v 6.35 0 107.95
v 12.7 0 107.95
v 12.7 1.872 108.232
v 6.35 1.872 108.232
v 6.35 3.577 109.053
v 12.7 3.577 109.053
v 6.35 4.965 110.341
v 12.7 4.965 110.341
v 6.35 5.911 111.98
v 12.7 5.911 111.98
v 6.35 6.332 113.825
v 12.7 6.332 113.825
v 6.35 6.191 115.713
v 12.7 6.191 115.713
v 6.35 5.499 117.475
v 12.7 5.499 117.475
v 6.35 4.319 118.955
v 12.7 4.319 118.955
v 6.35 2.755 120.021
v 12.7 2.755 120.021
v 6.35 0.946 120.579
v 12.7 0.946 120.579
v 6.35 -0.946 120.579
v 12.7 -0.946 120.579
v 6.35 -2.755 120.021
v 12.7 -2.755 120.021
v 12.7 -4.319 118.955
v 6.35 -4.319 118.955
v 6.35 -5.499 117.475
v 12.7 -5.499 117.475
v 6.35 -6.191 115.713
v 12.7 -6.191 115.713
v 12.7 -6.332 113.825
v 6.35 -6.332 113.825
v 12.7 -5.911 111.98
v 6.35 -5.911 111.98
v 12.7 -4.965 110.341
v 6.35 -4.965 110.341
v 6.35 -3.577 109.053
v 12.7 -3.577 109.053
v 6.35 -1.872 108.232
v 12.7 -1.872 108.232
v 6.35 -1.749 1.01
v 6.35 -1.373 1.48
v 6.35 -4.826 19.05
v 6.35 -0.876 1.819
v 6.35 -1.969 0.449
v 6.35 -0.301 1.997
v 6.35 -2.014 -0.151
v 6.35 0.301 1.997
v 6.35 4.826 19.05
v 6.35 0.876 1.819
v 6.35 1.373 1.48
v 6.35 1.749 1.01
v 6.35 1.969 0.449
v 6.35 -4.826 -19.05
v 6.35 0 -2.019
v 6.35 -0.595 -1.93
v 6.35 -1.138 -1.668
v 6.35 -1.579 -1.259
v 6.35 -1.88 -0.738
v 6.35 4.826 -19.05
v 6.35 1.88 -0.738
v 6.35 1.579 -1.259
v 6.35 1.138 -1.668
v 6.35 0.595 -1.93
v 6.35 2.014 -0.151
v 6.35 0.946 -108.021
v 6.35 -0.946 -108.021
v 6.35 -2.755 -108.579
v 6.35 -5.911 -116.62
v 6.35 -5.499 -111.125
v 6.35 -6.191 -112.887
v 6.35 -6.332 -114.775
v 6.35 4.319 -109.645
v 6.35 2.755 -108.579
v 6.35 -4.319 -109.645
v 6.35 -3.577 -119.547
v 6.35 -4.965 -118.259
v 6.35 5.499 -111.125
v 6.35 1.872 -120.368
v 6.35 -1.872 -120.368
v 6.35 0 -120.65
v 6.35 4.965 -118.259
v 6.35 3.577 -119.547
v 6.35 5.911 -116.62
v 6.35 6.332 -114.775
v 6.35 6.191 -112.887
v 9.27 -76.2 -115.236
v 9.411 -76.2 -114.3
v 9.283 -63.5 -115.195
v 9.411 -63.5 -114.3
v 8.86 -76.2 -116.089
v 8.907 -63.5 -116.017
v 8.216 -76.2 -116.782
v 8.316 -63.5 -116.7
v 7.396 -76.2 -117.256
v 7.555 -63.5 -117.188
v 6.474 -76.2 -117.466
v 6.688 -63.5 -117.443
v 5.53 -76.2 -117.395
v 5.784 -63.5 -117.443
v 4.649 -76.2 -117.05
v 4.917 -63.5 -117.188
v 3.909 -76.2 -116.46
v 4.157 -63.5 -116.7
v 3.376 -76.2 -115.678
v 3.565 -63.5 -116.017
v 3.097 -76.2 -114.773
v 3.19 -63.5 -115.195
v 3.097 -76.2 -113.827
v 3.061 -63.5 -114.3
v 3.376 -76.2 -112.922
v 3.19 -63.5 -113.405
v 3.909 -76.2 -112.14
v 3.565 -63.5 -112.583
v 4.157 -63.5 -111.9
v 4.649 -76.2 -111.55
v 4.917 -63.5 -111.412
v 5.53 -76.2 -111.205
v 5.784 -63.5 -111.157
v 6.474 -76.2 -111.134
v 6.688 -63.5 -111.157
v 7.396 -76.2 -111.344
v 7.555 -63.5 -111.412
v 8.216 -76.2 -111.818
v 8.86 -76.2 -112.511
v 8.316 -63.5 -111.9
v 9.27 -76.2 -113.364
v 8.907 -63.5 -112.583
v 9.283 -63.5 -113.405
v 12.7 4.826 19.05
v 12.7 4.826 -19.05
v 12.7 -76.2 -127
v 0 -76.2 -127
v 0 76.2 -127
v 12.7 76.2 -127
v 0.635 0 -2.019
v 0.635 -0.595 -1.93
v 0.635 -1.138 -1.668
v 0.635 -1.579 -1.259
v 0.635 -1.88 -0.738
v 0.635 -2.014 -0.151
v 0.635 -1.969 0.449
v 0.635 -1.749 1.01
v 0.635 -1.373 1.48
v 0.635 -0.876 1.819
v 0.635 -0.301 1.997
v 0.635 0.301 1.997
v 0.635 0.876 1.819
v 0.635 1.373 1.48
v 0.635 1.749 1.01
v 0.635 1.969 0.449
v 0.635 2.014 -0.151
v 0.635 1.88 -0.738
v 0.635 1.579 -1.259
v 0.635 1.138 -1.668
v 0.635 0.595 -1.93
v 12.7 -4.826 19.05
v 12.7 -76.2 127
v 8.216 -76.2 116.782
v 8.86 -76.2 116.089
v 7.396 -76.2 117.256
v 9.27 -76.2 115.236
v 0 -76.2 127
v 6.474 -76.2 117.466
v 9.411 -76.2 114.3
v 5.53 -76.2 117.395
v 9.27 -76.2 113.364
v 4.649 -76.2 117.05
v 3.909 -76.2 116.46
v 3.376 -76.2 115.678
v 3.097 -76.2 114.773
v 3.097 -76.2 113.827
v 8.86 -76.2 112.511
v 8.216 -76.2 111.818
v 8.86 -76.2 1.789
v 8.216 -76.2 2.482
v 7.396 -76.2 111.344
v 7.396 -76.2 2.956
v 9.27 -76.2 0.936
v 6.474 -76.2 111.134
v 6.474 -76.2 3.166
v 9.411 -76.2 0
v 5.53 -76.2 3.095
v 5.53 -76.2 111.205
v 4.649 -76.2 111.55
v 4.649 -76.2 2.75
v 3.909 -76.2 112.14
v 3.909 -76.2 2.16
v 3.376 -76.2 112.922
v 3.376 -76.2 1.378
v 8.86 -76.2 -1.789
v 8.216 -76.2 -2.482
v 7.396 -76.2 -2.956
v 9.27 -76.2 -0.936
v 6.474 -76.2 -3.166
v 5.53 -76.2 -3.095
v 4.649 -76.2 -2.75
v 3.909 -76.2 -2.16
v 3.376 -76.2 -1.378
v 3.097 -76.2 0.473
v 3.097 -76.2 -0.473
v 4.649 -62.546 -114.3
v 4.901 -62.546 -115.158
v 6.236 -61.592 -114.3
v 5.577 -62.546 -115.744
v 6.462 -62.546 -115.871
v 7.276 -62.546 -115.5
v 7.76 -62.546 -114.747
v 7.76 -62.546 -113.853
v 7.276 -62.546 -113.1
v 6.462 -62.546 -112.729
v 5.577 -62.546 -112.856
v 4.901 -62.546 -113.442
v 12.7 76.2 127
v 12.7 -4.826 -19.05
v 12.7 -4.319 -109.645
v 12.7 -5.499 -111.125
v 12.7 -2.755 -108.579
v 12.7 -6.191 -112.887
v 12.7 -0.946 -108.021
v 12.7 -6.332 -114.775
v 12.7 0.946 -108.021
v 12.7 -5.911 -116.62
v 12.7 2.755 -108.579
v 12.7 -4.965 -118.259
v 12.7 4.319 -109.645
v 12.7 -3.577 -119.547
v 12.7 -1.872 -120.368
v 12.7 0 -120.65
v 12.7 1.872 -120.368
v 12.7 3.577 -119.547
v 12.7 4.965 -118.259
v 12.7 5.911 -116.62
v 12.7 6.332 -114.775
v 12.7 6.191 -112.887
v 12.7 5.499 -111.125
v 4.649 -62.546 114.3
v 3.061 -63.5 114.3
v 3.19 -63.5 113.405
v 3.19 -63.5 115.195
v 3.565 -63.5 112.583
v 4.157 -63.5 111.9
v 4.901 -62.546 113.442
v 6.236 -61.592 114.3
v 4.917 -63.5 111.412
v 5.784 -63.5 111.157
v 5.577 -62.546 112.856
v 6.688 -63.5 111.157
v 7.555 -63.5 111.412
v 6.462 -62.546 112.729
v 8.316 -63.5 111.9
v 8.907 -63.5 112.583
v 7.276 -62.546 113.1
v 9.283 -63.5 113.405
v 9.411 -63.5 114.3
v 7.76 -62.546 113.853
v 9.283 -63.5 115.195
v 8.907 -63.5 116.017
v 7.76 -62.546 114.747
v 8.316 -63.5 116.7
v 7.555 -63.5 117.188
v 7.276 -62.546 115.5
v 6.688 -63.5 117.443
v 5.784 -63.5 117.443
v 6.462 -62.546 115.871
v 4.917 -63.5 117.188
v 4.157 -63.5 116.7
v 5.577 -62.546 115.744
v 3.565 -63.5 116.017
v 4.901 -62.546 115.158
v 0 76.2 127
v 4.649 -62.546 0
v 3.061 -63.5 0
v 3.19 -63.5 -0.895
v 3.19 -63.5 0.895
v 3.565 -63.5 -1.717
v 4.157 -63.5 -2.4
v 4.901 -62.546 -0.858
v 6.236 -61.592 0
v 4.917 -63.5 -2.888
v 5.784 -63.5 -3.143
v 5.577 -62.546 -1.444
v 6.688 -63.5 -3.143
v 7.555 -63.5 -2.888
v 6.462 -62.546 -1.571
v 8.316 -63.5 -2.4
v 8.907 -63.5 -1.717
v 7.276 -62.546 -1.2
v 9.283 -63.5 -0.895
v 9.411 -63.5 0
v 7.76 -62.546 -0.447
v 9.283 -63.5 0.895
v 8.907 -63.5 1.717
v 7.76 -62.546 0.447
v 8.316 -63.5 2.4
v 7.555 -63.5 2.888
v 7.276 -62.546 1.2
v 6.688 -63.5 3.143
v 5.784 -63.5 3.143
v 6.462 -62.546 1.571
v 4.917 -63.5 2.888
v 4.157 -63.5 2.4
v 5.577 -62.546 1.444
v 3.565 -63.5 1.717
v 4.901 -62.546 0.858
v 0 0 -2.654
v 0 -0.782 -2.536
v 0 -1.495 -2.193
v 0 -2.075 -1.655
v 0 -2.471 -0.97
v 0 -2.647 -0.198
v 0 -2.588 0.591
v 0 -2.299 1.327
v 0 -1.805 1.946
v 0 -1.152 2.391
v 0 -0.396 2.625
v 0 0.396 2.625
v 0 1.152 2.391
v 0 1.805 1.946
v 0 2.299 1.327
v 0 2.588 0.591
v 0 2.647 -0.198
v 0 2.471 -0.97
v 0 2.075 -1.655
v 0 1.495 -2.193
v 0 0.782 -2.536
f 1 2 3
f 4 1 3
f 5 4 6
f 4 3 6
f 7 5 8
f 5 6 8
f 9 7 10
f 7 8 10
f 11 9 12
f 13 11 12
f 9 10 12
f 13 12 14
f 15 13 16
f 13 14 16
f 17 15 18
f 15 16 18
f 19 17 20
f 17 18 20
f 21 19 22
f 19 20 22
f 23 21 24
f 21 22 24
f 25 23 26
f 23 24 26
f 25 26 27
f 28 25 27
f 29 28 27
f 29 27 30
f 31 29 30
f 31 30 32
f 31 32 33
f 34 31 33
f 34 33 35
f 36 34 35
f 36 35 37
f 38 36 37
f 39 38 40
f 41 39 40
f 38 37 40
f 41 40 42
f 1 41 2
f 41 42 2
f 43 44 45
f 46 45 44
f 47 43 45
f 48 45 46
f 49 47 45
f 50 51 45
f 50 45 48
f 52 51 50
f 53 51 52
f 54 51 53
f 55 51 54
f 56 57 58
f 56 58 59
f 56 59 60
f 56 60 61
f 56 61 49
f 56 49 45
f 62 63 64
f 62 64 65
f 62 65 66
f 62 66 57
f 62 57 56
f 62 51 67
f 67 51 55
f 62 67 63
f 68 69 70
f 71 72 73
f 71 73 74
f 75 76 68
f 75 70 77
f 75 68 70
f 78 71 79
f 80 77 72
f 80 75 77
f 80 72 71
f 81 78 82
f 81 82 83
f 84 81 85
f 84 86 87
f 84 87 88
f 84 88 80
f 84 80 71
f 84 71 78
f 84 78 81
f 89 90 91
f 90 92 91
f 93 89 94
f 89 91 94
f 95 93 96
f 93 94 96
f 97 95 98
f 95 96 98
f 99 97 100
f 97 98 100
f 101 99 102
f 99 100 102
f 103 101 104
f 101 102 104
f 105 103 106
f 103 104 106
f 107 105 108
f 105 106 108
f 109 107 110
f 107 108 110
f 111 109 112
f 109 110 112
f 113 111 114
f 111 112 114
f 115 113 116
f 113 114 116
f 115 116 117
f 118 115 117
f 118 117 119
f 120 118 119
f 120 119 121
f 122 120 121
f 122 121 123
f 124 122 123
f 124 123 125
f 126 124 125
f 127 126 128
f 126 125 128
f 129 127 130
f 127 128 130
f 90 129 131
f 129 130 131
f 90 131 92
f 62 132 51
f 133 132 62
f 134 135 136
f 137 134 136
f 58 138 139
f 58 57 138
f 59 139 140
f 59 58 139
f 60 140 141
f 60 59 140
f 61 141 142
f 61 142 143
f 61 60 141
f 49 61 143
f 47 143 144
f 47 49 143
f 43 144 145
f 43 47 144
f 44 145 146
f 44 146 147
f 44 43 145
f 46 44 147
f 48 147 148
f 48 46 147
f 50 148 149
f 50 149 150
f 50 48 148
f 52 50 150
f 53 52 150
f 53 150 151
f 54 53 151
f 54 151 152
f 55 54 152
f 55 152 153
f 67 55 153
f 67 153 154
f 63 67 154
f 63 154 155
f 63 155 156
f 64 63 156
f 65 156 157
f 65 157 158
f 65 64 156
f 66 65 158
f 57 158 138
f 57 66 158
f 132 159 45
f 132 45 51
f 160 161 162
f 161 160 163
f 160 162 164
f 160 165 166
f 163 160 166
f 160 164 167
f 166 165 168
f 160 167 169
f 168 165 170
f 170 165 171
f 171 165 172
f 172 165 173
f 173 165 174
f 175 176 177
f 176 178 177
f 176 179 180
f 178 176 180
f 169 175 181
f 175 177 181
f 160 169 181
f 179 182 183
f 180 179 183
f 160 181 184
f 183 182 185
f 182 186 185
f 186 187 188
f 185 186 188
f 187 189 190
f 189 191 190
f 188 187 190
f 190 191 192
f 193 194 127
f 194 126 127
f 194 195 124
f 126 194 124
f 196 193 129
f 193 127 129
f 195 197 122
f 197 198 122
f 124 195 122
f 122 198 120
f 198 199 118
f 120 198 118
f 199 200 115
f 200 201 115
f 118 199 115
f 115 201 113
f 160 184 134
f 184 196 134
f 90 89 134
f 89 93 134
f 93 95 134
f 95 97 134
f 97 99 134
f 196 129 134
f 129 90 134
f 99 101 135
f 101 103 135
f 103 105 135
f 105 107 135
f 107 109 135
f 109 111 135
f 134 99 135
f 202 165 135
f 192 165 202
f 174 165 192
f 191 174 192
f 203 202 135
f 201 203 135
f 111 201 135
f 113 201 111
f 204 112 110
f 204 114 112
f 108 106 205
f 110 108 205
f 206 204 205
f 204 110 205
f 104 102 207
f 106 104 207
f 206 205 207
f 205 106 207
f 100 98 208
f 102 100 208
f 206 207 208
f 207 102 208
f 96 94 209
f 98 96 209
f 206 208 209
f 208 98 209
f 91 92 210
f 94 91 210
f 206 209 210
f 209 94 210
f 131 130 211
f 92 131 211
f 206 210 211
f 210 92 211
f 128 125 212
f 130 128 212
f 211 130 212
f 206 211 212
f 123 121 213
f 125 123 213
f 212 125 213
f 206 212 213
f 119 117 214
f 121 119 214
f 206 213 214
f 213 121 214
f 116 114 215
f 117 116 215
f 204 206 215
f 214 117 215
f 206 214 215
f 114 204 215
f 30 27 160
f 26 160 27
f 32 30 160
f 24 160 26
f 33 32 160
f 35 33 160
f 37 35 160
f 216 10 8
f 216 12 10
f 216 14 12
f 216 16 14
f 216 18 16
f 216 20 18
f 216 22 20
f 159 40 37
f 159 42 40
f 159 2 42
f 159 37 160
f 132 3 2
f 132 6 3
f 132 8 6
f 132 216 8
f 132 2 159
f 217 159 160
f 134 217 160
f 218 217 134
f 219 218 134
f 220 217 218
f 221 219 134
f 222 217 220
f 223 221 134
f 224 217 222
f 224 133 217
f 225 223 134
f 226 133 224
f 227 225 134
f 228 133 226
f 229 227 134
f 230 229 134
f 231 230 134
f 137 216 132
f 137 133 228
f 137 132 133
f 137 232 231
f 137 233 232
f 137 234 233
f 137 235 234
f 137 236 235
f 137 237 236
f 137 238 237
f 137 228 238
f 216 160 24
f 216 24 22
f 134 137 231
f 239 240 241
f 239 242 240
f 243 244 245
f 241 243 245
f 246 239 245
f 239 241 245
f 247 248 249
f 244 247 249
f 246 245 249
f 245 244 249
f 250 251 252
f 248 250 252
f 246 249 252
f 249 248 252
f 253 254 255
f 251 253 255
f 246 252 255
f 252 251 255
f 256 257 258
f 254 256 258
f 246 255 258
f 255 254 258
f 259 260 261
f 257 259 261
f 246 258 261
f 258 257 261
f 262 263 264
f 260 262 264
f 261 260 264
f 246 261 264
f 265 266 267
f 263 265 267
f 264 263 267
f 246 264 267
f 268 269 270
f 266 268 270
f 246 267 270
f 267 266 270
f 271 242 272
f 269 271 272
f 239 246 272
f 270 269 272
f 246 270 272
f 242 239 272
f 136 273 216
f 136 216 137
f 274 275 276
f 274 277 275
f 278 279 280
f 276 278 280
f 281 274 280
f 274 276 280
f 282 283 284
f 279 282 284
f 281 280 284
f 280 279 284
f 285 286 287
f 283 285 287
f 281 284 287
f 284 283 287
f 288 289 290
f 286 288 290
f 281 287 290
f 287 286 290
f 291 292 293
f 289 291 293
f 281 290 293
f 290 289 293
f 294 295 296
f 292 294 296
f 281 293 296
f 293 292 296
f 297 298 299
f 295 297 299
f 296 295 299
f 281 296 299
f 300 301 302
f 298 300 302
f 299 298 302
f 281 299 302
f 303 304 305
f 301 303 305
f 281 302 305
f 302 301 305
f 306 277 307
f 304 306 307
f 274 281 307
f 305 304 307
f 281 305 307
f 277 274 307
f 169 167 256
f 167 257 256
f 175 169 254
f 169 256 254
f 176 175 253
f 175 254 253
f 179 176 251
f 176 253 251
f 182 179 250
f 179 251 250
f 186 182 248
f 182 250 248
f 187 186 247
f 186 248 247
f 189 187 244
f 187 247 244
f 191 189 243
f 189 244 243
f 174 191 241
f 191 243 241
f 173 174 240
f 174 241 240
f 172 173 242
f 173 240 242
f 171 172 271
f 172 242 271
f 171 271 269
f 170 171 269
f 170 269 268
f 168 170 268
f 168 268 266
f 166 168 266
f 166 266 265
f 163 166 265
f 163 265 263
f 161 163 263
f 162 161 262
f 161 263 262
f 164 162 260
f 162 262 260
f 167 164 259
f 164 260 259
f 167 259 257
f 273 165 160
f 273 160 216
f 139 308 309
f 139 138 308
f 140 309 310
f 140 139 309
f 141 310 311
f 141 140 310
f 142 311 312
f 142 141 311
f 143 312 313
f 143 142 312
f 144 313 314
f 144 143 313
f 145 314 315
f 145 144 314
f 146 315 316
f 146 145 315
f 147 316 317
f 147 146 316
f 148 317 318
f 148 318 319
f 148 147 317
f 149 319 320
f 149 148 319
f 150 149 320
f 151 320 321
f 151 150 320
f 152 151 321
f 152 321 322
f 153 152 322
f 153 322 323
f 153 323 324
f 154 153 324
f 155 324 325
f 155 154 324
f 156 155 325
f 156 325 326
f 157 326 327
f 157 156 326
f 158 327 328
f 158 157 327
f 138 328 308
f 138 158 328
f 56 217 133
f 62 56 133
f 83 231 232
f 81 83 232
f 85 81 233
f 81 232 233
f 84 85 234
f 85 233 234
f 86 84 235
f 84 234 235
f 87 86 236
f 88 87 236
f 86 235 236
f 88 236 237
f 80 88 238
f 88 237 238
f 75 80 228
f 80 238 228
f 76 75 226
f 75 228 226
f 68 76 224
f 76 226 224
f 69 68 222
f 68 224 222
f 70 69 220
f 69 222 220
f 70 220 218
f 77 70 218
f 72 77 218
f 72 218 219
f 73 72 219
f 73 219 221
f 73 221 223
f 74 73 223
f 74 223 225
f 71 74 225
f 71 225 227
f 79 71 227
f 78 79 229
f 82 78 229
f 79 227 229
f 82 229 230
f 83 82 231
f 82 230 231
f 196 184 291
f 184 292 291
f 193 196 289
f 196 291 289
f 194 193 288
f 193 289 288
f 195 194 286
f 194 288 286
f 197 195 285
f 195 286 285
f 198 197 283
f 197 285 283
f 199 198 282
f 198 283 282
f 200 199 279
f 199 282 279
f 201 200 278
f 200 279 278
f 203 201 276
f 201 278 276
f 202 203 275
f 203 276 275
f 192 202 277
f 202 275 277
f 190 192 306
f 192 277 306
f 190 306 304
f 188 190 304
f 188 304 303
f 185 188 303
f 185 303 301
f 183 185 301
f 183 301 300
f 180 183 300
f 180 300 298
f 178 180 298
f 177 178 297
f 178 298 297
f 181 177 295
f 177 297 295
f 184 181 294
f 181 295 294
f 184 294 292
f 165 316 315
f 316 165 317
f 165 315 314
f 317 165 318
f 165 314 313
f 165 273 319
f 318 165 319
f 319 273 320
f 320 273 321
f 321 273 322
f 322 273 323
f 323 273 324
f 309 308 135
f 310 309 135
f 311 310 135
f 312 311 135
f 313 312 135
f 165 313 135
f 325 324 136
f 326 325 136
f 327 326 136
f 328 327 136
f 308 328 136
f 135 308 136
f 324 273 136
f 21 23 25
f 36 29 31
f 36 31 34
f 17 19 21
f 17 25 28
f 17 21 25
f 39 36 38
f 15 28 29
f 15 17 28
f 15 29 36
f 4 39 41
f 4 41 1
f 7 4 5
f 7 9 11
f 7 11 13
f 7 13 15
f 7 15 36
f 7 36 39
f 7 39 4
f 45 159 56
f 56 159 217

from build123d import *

# Parameters (mm, degrees)
SKETCH1_W                       = 254
SKETCH1_H                       = 152.4
BOSS_EXTRUDE1_DEPTH             = 12.7
SKETCH3_R                       = 6.35
CUT_EXTRUDE2_DEPTH              = 6.35
F_1_4_0_25_DIAMETER_HOLE1_D     = 6.35
F_1_4_0_25_DIAMETER_HOLE1_DEPTH = 12.7
F_1_4_0_25_DIAMETER_HOLE1_TIP   = 1.907732465
SKETCH7_W                       = 38.1
SKETCH7_H                       = 9.652
CUT_EXTRUDE3_DEPTH              = 6.35


with BuildPart() as part:
    # Sketch1 → Boss-Extrude1 (new body)
    with BuildSketch(Plane(origin=(0, 0, 0), x_dir=(0, 0, -1), z_dir=(1, 0, 0))):
        Rectangle(SKETCH1_W, SKETCH1_H)
    extrude(amount=BOSS_EXTRUDE1_DEPTH)

    # Sketch3 → Cut-Extrude2 (cut)
    with BuildSketch(Plane(origin=(12.7, 0, 0), x_dir=(0, 0, -1), z_dir=(1, 0, 0))):
        with Locations((114.3, 0)):
            Circle(SKETCH3_R)
        with Locations((-114.3, 0)):
            Circle(SKETCH3_R)
    extrude(amount=-CUT_EXTRUDE2_DEPTH, mode=Mode.SUBTRACT)

    # 1/4 (0.25) Diameter Hole1
    with Locations(Plane(origin=(0, -76.2, 0), x_dir=(-1, 0, 0), z_dir=(0, -1, 0))):
        with Locations((-6.236337014, -114.3), (-6.236337014, 0), (-6.236337014, 114.3)):
            Hole(F_1_4_0_25_DIAMETER_HOLE1_D / 2, depth=F_1_4_0_25_DIAMETER_HOLE1_DEPTH)
            with Locations((0, 0, -(F_1_4_0_25_DIAMETER_HOLE1_DEPTH + F_1_4_0_25_DIAMETER_HOLE1_TIP / 2))):  # 118° drill point
                Cone(0, F_1_4_0_25_DIAMETER_HOLE1_D / 2, F_1_4_0_25_DIAMETER_HOLE1_TIP, mode=Mode.SUBTRACT)

    # Sketch7 → Cut-Extrude3 (cut)
    with BuildSketch(Plane(origin=(12.7, 0, 0), x_dir=(0, 0, -1), z_dir=(1, 0, 0))):
        Rectangle(SKETCH7_W, SKETCH7_H)
    extrude(amount=-CUT_EXTRUDE3_DEPTH, mode=Mode.SUBTRACT)

    # Sketch10 → #10-32 Tapped Hole1 (revolve, cut)
    with BuildSketch(Plane(origin=(6.35, 0, 0), x_dir=(0, 0, -1), z_dir=(0, 1, 0))):
        Polygon((0, 0), (0, 6.35), (2.6543, 6.35), (2.0193, 5.715), (2.0193, 0), align=None)
    revolve(axis=Axis((12.7, 0, 0), (-1, 0, 0)), mode=Mode.SUBTRACT)


solid = part.part
